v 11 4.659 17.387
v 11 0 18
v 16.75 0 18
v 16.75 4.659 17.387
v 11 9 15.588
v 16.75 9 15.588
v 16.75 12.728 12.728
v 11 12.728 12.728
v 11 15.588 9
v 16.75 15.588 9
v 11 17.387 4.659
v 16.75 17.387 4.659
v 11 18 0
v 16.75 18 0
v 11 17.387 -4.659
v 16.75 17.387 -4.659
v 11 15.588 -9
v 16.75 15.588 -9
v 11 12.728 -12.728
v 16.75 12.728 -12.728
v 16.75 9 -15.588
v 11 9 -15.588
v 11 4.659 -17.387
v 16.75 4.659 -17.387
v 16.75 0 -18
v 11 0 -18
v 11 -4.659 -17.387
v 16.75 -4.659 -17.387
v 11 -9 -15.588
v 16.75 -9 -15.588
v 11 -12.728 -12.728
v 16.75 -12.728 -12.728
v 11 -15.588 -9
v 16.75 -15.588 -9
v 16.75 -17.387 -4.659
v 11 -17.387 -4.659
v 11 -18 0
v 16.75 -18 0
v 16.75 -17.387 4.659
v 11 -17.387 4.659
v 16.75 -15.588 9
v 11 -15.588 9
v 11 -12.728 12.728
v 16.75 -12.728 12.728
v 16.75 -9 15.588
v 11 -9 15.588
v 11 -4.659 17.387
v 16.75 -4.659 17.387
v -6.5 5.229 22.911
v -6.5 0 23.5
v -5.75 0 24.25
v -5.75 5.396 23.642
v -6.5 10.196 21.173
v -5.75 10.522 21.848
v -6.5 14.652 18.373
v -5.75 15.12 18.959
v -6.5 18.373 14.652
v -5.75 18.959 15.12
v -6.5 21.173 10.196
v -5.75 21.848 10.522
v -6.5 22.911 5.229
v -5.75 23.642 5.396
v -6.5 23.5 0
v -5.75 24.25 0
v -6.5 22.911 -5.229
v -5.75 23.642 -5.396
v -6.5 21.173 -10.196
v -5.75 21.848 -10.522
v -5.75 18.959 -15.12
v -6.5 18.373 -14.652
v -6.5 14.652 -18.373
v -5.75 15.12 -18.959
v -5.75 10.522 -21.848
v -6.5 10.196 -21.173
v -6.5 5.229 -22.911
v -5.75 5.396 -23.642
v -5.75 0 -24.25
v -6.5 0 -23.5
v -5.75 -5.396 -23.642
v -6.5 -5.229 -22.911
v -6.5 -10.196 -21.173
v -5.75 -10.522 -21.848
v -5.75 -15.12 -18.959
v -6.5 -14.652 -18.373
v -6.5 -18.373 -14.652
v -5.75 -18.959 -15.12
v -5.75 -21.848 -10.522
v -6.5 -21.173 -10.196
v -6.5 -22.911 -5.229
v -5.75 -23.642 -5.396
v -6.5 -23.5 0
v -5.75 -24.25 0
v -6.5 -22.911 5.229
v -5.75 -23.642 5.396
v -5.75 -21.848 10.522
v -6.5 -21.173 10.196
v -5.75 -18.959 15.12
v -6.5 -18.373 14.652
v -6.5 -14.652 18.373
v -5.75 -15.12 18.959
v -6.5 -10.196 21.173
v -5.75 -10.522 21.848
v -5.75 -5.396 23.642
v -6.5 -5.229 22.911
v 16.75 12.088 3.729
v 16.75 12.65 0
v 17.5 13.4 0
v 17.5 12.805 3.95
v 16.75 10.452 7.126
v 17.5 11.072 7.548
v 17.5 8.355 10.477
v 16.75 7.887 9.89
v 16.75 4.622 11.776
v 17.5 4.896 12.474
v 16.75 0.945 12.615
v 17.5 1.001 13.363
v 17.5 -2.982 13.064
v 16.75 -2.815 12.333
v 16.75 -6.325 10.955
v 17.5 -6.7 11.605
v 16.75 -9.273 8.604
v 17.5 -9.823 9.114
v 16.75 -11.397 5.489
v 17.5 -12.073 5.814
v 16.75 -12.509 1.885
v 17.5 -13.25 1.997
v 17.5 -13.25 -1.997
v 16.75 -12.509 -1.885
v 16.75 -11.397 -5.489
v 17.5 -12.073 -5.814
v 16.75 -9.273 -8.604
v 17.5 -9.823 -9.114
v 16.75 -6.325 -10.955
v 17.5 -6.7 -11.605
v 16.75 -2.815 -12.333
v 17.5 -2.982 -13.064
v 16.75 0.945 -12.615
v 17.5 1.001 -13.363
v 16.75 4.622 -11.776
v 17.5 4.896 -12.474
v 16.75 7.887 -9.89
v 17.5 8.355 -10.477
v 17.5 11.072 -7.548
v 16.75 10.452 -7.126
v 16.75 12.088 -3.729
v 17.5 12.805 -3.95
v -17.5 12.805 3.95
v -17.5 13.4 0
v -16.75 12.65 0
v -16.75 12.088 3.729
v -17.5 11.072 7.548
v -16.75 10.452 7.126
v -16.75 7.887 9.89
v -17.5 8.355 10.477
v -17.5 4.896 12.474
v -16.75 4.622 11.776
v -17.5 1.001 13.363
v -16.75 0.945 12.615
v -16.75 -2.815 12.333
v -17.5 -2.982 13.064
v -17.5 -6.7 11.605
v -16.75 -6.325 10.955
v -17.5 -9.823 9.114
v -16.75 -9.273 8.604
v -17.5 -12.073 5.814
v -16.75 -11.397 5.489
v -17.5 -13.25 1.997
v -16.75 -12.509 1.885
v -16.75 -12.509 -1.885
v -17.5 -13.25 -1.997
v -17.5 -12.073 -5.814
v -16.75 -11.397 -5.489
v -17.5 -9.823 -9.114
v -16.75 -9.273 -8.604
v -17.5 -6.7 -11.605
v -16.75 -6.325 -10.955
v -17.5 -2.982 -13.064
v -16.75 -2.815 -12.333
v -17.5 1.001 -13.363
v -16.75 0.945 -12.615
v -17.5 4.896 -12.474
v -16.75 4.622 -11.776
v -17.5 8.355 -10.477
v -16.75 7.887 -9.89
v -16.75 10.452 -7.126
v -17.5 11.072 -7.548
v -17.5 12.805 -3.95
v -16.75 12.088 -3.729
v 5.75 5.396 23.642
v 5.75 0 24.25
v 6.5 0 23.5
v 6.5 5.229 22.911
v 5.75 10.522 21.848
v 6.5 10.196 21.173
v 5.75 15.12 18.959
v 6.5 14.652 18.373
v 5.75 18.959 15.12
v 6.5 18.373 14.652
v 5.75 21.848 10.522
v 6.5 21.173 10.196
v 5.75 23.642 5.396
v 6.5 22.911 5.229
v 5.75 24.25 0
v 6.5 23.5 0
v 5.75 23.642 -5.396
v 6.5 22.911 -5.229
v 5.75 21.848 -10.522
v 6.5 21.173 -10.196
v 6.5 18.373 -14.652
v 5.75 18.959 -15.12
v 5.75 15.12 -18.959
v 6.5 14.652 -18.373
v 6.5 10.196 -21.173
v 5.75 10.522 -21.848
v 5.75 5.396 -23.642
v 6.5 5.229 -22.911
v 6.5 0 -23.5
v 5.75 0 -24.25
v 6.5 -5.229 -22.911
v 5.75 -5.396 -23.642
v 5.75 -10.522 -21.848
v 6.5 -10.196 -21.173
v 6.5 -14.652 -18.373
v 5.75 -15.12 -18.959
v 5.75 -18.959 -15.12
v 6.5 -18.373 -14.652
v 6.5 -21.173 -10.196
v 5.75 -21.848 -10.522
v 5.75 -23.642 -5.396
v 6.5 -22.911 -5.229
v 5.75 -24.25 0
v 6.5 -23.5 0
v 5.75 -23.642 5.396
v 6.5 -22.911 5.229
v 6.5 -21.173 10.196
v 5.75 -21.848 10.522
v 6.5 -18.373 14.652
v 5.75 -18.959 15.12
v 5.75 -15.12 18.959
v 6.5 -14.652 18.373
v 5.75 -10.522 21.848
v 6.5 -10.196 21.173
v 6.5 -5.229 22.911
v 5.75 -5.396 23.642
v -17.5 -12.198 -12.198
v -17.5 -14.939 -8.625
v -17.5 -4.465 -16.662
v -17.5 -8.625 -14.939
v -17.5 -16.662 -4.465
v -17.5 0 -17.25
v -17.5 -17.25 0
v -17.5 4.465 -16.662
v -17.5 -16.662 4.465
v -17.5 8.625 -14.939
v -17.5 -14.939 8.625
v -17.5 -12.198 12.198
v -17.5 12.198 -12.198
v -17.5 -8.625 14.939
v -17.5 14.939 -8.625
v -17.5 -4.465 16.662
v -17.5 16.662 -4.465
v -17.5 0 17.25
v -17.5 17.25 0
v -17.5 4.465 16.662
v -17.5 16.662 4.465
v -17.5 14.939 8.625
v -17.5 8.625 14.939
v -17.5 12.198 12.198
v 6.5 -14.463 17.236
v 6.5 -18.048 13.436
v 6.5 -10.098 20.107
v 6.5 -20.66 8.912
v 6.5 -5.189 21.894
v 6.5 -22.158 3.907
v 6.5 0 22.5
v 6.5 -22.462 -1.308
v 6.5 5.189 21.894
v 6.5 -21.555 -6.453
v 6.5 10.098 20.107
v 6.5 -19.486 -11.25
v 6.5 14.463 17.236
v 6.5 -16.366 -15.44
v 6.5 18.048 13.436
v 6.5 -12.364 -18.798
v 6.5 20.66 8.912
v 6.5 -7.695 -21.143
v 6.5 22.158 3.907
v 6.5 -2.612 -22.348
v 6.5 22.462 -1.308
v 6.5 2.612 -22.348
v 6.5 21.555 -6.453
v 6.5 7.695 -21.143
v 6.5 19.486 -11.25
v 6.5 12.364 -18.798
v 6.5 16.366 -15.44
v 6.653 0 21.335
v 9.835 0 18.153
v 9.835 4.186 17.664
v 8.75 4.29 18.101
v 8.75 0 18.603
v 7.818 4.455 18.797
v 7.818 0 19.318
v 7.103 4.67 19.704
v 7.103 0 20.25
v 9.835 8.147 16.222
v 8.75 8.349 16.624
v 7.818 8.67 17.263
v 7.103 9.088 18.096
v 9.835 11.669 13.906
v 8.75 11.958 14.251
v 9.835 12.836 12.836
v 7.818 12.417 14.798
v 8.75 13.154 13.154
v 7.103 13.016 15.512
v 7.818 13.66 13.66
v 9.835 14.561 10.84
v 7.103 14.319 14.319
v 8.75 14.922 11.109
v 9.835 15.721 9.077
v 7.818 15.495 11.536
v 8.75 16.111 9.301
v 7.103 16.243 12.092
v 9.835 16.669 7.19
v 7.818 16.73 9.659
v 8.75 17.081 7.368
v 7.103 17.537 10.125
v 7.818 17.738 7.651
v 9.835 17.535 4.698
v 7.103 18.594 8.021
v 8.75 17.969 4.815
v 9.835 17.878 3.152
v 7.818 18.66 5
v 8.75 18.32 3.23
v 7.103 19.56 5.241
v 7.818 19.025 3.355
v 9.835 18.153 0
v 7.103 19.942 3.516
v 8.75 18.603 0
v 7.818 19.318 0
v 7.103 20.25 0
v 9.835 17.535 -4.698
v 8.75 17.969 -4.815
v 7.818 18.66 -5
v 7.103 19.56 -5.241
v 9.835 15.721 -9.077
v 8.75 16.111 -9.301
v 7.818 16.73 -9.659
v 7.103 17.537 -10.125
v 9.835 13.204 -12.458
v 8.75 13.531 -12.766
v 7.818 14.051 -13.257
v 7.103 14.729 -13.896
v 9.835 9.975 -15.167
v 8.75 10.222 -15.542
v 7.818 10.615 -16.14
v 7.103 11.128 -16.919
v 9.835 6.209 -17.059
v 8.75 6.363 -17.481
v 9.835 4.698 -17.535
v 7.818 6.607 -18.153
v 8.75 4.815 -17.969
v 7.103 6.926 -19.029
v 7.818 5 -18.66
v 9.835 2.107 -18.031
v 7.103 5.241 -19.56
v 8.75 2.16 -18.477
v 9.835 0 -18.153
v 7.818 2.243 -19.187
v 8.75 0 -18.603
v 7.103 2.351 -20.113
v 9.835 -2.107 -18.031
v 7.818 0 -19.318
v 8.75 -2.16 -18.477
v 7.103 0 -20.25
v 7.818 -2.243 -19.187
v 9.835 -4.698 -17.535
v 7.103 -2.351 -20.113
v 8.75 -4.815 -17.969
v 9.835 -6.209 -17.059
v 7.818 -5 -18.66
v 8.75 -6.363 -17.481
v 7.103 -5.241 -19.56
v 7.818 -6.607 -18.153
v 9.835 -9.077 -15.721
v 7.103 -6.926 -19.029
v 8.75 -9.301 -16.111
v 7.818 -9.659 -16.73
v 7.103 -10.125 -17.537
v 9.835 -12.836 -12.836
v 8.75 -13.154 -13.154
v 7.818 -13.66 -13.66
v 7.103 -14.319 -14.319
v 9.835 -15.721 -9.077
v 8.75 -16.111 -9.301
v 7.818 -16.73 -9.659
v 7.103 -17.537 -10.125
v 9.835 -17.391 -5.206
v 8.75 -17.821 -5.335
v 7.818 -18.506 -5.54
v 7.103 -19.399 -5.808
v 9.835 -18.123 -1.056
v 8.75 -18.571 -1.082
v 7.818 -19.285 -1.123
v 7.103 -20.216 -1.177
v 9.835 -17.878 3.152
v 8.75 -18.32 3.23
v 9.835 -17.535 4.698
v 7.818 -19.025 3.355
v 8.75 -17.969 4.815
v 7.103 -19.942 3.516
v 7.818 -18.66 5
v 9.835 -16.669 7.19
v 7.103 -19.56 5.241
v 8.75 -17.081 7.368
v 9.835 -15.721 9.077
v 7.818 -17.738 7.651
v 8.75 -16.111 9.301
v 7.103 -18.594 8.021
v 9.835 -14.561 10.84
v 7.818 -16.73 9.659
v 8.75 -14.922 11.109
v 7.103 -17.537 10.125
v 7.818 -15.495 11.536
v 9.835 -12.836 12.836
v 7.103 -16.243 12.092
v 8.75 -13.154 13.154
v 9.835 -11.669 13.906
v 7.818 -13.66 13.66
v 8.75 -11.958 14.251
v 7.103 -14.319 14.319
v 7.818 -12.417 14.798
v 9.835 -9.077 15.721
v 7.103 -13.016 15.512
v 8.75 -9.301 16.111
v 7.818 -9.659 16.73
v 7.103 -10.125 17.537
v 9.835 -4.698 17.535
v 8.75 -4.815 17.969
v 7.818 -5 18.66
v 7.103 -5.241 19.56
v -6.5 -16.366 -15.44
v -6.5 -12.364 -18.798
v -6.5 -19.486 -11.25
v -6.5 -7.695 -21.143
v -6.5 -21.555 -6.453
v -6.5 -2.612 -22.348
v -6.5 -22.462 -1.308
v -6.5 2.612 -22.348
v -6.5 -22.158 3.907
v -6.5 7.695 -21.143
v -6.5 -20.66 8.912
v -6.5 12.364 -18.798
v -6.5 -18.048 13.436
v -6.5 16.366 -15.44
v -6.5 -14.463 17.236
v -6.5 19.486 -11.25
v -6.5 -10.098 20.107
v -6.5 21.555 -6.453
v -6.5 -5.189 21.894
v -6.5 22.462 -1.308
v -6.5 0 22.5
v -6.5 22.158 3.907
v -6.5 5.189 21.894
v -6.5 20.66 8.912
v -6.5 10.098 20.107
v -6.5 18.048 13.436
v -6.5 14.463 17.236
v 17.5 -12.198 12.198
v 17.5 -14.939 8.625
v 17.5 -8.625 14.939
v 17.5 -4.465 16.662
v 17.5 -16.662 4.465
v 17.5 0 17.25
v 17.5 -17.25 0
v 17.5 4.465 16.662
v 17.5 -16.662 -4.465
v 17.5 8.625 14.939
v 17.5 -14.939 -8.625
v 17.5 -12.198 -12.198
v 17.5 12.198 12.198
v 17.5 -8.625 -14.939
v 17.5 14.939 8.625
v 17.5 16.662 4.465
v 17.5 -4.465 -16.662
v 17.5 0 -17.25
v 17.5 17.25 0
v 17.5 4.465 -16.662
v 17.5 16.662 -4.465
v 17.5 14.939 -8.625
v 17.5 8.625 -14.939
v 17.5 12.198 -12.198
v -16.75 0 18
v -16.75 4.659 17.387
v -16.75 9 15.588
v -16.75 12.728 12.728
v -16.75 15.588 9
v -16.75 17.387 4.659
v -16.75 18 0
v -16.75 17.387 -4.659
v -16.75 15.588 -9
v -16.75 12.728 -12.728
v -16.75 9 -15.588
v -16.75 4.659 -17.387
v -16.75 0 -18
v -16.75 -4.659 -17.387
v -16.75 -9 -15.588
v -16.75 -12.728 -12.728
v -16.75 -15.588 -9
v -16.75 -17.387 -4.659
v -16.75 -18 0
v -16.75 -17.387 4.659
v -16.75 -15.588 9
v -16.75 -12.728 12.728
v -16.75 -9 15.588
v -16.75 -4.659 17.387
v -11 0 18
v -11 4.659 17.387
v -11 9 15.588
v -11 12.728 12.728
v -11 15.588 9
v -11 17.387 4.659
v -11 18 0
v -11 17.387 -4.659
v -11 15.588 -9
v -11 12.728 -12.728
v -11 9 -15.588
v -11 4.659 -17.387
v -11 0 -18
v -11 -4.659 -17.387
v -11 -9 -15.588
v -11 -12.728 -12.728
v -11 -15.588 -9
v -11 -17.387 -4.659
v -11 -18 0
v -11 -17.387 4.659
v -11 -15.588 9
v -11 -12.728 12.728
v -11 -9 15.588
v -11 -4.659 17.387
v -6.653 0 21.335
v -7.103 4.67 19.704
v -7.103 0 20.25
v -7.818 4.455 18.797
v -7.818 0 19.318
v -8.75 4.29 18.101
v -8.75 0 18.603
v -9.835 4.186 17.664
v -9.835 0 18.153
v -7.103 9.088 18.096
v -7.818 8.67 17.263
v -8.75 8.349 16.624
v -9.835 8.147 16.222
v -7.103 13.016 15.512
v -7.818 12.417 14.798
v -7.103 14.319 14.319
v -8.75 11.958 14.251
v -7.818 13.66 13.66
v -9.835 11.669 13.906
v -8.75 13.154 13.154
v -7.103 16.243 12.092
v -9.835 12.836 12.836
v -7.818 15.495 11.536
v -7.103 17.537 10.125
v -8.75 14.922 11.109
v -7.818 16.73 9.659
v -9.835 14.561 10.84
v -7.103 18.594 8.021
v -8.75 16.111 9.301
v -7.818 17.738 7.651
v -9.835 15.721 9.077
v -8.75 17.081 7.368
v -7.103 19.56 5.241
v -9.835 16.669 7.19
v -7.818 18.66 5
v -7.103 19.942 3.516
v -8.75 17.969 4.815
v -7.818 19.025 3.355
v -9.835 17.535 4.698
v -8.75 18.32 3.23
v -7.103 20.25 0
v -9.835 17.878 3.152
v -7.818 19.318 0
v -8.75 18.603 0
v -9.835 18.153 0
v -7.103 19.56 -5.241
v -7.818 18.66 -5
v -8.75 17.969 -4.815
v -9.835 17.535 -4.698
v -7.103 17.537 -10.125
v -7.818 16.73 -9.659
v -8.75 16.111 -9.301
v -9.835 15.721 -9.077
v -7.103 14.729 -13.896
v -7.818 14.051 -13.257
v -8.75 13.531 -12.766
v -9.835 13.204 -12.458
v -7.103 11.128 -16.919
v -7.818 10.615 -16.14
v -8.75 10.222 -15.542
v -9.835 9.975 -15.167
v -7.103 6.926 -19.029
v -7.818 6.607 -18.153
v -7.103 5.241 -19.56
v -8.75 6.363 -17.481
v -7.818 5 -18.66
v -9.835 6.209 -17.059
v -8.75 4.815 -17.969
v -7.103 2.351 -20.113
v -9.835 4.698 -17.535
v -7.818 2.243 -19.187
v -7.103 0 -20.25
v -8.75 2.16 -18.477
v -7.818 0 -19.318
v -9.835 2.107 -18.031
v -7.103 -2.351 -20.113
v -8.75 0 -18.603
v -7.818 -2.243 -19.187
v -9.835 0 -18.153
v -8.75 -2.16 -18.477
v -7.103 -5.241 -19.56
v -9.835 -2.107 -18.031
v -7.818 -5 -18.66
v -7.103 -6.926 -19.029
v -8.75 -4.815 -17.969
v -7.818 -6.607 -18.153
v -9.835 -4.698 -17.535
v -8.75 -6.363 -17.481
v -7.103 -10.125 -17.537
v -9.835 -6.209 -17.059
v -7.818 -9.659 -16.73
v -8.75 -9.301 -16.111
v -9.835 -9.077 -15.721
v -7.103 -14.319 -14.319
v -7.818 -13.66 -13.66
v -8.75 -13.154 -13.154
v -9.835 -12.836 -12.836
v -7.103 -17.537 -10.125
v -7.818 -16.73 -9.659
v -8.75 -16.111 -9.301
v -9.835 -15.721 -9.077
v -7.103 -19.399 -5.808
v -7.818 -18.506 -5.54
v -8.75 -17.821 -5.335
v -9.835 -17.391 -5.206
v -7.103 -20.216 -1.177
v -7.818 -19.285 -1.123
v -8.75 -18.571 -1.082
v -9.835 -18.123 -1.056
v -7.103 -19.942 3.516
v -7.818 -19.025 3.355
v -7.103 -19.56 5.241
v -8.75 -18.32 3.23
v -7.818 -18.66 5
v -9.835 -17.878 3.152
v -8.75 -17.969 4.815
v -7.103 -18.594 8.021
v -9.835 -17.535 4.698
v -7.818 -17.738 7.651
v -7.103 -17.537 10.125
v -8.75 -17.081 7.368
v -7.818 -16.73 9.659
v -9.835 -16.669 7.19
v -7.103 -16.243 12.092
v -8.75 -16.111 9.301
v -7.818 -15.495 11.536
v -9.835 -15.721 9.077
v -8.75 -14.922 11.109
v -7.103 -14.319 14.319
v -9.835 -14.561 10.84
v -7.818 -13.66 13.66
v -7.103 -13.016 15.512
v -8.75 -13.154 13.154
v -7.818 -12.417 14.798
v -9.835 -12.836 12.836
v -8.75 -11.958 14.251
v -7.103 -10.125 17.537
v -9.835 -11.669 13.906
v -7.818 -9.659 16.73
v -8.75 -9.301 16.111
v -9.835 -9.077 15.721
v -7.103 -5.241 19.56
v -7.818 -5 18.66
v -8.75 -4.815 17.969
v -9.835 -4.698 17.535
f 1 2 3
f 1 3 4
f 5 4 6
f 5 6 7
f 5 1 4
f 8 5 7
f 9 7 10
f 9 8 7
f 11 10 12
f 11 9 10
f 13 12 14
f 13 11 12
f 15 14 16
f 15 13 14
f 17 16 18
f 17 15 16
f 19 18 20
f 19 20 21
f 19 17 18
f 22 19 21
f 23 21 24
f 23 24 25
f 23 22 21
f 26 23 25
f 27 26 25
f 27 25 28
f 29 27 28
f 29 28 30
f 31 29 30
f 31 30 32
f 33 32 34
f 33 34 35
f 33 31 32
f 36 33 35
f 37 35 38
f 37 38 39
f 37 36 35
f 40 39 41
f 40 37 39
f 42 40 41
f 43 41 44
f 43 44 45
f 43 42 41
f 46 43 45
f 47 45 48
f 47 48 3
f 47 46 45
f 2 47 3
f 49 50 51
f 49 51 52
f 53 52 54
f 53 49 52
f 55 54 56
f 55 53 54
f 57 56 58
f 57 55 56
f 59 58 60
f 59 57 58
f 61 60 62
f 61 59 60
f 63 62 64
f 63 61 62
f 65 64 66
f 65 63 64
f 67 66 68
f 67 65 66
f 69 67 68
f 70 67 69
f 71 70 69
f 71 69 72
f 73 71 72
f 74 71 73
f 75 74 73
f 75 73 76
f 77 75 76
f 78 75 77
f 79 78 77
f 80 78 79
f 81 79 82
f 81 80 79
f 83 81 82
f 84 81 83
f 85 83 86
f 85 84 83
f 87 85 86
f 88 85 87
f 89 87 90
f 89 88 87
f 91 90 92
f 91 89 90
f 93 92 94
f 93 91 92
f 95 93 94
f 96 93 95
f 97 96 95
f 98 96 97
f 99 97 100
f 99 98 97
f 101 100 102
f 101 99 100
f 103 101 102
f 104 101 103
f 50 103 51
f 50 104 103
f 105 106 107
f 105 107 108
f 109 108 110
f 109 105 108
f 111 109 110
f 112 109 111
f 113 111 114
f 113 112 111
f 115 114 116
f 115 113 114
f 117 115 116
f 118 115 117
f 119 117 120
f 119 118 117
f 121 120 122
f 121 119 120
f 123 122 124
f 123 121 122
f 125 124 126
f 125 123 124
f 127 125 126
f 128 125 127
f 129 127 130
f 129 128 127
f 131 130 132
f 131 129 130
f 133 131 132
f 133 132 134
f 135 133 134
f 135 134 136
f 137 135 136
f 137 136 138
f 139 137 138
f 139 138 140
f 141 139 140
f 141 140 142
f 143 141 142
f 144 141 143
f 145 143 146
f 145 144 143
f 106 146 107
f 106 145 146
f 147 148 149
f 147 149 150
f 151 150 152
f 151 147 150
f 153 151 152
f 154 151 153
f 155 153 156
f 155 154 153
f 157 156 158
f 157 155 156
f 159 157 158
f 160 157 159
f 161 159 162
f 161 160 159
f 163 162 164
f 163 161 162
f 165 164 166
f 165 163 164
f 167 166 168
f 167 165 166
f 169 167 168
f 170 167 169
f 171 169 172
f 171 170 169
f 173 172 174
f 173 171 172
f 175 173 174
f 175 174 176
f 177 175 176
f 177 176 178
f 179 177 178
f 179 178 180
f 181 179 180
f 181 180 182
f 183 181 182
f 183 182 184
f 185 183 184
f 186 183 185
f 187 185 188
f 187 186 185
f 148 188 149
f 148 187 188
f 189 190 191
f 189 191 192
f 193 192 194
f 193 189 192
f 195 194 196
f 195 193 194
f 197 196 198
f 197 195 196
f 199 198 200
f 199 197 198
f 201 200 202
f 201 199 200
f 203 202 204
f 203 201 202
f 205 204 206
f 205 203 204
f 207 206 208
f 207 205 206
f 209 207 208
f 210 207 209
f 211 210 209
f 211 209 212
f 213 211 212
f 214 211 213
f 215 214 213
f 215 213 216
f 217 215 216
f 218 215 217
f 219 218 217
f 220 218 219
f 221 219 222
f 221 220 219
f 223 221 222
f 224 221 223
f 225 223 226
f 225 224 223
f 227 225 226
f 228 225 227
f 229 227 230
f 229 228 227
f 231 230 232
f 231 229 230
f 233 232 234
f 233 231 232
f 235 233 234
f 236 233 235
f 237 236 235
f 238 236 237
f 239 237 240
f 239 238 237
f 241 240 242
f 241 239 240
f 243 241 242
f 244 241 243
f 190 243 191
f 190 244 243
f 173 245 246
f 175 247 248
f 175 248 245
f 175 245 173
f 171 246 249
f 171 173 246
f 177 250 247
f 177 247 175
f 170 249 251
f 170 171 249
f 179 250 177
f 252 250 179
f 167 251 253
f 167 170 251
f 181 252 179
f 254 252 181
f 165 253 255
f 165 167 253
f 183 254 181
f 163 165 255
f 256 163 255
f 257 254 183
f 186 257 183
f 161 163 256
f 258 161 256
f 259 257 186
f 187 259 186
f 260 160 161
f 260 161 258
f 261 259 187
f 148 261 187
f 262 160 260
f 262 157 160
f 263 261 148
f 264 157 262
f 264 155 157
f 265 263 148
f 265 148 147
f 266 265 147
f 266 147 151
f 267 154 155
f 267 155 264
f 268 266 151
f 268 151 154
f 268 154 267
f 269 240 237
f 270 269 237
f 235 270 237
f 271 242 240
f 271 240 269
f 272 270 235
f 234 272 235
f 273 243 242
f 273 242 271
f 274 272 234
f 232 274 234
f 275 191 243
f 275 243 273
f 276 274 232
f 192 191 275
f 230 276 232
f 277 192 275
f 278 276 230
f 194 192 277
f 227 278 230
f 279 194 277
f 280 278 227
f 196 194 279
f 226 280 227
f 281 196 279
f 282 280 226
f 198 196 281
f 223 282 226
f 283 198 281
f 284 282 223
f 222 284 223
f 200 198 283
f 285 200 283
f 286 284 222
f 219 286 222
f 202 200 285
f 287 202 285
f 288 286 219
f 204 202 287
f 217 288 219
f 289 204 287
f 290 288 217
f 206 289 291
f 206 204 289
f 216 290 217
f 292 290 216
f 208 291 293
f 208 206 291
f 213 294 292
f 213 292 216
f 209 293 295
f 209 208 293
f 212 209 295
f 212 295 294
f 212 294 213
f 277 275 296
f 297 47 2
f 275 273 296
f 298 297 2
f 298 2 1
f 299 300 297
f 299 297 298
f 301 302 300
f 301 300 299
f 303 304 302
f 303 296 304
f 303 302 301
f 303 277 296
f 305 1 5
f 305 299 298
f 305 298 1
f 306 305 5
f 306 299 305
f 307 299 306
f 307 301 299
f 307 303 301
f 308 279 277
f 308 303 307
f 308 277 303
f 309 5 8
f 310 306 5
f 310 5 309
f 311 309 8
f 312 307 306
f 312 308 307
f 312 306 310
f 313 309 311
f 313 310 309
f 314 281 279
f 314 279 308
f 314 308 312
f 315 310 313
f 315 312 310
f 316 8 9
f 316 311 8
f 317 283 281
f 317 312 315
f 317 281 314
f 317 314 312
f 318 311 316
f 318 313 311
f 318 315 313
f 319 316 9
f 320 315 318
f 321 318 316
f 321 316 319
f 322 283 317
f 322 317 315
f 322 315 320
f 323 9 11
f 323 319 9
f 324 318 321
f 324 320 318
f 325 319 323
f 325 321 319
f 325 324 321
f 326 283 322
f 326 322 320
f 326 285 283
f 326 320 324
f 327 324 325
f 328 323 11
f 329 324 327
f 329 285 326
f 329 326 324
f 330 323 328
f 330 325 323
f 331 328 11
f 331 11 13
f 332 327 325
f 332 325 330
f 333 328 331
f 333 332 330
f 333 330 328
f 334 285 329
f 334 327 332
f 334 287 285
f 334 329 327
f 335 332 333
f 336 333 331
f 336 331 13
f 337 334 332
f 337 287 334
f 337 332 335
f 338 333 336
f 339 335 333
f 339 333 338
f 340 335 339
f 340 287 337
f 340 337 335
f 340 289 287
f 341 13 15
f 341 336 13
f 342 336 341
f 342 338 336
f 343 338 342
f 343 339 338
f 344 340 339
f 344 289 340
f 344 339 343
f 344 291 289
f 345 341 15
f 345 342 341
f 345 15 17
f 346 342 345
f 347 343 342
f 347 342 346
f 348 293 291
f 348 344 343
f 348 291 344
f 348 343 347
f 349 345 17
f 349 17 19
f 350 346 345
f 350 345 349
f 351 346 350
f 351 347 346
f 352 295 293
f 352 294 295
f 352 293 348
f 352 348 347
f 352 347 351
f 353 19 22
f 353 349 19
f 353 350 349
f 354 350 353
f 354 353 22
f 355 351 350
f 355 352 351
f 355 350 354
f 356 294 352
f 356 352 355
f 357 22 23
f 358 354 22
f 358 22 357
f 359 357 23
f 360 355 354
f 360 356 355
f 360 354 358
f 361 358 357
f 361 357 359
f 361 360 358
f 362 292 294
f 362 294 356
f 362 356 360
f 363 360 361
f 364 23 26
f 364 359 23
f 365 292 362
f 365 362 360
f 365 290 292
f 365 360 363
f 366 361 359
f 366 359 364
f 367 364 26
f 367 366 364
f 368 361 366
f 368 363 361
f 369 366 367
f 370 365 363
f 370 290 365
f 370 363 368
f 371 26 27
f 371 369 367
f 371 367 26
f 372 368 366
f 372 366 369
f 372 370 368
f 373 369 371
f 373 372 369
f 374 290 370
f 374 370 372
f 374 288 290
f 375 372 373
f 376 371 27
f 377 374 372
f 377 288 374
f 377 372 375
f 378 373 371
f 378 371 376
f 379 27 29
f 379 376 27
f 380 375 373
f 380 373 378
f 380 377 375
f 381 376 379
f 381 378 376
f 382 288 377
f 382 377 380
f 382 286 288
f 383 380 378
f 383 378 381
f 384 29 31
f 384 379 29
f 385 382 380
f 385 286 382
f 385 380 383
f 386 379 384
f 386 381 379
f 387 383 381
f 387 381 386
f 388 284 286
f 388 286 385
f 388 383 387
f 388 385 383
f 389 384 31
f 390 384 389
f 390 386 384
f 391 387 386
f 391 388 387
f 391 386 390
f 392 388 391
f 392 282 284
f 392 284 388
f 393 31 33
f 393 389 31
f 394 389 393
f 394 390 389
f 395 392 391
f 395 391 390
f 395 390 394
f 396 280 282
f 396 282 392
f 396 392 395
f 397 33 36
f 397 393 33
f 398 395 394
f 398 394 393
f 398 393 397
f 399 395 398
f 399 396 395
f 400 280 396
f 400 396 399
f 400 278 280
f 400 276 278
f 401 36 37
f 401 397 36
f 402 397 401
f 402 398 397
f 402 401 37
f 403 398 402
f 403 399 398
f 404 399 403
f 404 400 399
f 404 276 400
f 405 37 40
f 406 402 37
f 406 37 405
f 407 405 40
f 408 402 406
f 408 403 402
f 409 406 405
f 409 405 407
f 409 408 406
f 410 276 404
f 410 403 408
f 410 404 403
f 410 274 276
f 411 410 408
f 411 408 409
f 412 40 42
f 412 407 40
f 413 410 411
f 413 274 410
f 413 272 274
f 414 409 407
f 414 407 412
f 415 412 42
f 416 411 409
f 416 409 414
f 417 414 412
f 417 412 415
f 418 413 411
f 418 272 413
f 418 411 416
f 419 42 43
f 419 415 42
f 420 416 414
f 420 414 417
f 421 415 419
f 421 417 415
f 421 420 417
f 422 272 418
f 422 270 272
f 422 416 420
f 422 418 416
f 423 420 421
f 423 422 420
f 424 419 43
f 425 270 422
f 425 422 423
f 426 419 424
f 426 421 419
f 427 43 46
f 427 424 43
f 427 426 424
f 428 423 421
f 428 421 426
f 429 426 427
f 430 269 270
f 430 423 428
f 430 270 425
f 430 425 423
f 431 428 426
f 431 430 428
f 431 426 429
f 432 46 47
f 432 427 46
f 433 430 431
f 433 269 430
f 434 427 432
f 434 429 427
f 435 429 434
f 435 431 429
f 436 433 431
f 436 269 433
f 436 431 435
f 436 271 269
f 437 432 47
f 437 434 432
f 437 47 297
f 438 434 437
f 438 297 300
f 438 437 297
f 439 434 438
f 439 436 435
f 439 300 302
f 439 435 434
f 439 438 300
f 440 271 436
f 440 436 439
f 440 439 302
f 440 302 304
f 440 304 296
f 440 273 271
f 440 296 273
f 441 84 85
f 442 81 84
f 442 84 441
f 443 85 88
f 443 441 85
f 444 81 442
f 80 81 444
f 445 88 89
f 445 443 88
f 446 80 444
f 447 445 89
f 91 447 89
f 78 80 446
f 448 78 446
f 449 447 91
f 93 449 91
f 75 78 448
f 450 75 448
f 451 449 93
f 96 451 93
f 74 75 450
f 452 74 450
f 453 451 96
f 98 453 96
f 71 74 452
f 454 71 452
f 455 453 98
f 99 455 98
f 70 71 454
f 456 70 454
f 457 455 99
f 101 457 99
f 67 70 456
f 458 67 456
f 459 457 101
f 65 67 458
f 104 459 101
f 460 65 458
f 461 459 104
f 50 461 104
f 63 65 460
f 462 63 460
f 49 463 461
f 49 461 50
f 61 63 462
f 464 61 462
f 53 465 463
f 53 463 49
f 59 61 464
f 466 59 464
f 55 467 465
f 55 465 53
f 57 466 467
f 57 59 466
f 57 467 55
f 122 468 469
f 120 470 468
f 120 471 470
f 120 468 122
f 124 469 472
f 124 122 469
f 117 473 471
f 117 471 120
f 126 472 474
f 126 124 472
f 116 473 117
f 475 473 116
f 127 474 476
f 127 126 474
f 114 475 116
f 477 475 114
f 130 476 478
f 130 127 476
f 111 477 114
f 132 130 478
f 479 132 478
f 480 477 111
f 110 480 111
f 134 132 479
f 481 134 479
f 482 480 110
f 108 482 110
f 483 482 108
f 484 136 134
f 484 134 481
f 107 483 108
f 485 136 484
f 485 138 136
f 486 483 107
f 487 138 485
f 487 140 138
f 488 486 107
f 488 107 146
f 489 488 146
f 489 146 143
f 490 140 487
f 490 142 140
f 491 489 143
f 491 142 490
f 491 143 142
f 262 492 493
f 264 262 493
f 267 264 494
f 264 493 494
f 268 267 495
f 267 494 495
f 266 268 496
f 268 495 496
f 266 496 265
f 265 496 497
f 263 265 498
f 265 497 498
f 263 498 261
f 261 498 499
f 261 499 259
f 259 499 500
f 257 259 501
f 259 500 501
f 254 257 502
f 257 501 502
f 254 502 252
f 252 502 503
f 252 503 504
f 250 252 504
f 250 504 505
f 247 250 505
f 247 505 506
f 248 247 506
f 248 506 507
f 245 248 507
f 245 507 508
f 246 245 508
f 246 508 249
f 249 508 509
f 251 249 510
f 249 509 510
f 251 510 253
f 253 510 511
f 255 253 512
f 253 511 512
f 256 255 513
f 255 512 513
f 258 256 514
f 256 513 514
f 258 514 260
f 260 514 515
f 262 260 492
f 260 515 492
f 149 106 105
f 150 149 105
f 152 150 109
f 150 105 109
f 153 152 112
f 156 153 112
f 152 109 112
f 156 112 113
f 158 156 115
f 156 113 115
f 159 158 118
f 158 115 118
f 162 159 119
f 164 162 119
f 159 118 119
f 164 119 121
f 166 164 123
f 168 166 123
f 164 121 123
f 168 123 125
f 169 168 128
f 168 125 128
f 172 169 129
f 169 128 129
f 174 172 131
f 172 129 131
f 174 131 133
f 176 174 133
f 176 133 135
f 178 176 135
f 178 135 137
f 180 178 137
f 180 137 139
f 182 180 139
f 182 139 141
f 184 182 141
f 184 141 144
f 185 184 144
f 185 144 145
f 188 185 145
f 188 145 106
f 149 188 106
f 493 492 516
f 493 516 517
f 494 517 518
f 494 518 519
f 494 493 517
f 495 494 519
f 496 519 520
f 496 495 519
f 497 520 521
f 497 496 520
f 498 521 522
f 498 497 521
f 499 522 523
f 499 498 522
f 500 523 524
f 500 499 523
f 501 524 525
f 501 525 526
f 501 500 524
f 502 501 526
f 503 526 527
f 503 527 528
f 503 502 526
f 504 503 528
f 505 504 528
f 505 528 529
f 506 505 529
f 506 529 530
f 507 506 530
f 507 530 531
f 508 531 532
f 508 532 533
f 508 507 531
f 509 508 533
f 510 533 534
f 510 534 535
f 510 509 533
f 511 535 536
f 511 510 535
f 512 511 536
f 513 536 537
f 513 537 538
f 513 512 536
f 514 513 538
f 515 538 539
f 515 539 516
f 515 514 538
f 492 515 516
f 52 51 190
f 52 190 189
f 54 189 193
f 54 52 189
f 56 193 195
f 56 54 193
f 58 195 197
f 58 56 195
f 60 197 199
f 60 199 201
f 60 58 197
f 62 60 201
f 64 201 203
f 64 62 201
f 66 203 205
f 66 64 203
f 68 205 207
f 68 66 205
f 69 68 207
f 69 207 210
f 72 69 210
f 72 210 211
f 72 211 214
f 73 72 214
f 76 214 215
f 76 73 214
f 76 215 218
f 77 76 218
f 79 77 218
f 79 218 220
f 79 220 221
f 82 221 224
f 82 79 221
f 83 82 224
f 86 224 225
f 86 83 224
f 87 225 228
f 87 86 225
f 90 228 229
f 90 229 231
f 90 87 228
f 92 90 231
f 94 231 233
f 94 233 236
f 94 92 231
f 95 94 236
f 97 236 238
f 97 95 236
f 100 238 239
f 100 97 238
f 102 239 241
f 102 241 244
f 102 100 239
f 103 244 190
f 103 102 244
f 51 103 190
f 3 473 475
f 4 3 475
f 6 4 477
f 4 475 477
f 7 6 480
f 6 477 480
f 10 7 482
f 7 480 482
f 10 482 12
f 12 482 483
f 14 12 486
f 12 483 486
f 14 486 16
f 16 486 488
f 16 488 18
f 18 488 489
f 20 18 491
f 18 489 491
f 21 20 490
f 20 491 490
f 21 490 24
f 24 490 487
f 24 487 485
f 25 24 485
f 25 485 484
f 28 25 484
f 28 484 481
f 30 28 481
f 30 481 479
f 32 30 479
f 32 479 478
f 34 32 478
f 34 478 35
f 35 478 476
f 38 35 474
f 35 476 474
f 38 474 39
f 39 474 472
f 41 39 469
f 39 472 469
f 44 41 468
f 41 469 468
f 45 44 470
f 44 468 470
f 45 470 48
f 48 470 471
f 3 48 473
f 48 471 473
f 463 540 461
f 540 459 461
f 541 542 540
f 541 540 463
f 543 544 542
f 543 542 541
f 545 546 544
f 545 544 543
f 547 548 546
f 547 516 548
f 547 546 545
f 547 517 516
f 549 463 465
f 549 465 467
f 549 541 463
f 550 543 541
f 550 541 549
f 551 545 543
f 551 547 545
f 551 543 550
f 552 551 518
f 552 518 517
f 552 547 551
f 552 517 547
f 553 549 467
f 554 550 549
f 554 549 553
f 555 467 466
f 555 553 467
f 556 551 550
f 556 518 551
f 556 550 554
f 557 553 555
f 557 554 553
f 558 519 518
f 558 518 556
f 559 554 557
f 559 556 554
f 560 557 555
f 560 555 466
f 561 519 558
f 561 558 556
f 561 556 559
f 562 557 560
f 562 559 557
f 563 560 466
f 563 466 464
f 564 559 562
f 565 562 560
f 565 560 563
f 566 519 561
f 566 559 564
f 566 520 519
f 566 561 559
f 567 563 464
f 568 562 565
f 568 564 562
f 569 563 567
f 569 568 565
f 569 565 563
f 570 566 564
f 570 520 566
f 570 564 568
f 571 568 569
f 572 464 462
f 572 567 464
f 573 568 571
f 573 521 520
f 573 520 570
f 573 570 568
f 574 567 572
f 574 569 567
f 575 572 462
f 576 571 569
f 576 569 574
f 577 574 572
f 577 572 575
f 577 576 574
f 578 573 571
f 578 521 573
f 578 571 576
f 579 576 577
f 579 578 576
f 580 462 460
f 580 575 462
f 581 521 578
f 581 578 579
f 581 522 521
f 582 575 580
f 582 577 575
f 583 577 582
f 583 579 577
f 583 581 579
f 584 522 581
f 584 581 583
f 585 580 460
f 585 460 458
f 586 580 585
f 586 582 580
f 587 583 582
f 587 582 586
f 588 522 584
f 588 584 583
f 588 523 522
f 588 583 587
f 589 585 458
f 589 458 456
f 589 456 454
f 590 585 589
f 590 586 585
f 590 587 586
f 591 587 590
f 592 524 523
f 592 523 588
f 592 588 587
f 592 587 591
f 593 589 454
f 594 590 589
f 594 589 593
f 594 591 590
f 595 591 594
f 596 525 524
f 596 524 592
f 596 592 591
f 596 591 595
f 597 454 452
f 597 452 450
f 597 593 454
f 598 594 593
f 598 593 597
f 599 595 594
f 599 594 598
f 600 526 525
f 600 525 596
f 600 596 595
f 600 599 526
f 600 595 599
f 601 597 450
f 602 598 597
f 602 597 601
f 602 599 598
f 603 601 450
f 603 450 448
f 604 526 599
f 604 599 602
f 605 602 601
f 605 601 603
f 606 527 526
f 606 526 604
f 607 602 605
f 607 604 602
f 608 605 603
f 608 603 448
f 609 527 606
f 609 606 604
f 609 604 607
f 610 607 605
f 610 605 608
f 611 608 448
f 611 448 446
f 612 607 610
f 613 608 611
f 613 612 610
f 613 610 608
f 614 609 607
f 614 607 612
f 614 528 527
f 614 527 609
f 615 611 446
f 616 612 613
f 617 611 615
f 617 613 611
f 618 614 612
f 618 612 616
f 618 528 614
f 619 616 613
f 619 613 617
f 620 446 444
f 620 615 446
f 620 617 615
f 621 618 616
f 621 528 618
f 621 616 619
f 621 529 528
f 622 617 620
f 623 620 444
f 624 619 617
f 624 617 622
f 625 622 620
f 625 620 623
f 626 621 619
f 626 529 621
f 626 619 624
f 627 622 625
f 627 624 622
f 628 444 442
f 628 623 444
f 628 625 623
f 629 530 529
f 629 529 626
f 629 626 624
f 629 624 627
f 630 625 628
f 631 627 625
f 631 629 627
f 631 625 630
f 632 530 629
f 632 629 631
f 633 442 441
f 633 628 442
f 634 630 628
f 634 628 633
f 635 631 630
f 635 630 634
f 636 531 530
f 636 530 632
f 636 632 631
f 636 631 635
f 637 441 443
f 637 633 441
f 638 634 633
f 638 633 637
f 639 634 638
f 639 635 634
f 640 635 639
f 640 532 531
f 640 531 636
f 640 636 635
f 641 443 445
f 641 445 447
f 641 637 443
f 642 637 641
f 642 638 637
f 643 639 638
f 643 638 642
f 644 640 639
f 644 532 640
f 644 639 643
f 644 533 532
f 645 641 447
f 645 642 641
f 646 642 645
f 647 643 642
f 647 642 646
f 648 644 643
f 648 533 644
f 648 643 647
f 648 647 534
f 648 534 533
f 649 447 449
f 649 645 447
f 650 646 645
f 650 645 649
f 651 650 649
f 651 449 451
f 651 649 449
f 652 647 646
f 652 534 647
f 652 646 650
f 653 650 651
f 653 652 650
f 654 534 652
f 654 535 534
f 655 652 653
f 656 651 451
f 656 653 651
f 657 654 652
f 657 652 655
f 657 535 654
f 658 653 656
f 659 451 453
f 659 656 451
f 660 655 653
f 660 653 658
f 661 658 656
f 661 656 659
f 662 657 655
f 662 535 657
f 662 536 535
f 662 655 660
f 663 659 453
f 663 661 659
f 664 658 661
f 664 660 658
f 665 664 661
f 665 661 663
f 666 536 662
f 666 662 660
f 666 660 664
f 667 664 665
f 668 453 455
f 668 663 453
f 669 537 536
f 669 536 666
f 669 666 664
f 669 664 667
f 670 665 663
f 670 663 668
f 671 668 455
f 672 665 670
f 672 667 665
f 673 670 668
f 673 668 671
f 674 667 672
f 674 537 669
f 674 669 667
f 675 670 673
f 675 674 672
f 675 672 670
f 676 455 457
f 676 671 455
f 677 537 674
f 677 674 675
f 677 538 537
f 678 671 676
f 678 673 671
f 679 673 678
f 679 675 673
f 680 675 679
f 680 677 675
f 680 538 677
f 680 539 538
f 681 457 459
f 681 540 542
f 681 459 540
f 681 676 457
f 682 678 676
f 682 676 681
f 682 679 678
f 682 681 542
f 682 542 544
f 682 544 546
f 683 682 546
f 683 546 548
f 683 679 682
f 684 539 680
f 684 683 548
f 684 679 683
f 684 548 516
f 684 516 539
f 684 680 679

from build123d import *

# Parameters (mm, degrees)
F2_R     = 4.5
F3_R     = 12.65
F4_DEPTH = 35.001
F5_SIZE  = 0.75


with BuildPart() as f1:
    # F0 (on Front) → F1 (revolve)
    with BuildSketch(Plane.XZ):
        Polygon((-17.5, 0), (0, 0), (17.5, 0), (17.5, 18), (6.5, 18), (6.5, 24.25), (-6.5, 24.25), (-6.5, 18), (-17.5, 18), align=None)
    revolve(axis=Axis((-8.75, 0, 0), (-1, 0, 0)))

    # F2
    f2_edges = [f1.edges().sort_by_distance(p)[0] for p in [
        (6.5, 0, -18),
        (-6.5, 0, -18),
    ]]
    fillet(f2_edges, radius=F2_R)

    # F3 (on face) → F4 (cut, through all)
    with BuildSketch(Plane.YZ.offset(17.5)):
        Circle(F3_R)
    extrude(amount=-F4_DEPTH, mode=Mode.SUBTRACT)

    # F5
    f5_edges = [f1.edges().sort_by_distance(p)[0] for p in [
        (17.5, -12.65, 0),
        (0, 12.65, 0),
        (-17.5, -12.65, 0),
        (-6.5, 0, -24.25),
        (-17.5, 0, -18),
        (6.5, 0, -24.25),
        (17.5, 0, -18),
    ]]
    chamfer(f5_edges, length=F5_SIZE)


solid = f1.part
